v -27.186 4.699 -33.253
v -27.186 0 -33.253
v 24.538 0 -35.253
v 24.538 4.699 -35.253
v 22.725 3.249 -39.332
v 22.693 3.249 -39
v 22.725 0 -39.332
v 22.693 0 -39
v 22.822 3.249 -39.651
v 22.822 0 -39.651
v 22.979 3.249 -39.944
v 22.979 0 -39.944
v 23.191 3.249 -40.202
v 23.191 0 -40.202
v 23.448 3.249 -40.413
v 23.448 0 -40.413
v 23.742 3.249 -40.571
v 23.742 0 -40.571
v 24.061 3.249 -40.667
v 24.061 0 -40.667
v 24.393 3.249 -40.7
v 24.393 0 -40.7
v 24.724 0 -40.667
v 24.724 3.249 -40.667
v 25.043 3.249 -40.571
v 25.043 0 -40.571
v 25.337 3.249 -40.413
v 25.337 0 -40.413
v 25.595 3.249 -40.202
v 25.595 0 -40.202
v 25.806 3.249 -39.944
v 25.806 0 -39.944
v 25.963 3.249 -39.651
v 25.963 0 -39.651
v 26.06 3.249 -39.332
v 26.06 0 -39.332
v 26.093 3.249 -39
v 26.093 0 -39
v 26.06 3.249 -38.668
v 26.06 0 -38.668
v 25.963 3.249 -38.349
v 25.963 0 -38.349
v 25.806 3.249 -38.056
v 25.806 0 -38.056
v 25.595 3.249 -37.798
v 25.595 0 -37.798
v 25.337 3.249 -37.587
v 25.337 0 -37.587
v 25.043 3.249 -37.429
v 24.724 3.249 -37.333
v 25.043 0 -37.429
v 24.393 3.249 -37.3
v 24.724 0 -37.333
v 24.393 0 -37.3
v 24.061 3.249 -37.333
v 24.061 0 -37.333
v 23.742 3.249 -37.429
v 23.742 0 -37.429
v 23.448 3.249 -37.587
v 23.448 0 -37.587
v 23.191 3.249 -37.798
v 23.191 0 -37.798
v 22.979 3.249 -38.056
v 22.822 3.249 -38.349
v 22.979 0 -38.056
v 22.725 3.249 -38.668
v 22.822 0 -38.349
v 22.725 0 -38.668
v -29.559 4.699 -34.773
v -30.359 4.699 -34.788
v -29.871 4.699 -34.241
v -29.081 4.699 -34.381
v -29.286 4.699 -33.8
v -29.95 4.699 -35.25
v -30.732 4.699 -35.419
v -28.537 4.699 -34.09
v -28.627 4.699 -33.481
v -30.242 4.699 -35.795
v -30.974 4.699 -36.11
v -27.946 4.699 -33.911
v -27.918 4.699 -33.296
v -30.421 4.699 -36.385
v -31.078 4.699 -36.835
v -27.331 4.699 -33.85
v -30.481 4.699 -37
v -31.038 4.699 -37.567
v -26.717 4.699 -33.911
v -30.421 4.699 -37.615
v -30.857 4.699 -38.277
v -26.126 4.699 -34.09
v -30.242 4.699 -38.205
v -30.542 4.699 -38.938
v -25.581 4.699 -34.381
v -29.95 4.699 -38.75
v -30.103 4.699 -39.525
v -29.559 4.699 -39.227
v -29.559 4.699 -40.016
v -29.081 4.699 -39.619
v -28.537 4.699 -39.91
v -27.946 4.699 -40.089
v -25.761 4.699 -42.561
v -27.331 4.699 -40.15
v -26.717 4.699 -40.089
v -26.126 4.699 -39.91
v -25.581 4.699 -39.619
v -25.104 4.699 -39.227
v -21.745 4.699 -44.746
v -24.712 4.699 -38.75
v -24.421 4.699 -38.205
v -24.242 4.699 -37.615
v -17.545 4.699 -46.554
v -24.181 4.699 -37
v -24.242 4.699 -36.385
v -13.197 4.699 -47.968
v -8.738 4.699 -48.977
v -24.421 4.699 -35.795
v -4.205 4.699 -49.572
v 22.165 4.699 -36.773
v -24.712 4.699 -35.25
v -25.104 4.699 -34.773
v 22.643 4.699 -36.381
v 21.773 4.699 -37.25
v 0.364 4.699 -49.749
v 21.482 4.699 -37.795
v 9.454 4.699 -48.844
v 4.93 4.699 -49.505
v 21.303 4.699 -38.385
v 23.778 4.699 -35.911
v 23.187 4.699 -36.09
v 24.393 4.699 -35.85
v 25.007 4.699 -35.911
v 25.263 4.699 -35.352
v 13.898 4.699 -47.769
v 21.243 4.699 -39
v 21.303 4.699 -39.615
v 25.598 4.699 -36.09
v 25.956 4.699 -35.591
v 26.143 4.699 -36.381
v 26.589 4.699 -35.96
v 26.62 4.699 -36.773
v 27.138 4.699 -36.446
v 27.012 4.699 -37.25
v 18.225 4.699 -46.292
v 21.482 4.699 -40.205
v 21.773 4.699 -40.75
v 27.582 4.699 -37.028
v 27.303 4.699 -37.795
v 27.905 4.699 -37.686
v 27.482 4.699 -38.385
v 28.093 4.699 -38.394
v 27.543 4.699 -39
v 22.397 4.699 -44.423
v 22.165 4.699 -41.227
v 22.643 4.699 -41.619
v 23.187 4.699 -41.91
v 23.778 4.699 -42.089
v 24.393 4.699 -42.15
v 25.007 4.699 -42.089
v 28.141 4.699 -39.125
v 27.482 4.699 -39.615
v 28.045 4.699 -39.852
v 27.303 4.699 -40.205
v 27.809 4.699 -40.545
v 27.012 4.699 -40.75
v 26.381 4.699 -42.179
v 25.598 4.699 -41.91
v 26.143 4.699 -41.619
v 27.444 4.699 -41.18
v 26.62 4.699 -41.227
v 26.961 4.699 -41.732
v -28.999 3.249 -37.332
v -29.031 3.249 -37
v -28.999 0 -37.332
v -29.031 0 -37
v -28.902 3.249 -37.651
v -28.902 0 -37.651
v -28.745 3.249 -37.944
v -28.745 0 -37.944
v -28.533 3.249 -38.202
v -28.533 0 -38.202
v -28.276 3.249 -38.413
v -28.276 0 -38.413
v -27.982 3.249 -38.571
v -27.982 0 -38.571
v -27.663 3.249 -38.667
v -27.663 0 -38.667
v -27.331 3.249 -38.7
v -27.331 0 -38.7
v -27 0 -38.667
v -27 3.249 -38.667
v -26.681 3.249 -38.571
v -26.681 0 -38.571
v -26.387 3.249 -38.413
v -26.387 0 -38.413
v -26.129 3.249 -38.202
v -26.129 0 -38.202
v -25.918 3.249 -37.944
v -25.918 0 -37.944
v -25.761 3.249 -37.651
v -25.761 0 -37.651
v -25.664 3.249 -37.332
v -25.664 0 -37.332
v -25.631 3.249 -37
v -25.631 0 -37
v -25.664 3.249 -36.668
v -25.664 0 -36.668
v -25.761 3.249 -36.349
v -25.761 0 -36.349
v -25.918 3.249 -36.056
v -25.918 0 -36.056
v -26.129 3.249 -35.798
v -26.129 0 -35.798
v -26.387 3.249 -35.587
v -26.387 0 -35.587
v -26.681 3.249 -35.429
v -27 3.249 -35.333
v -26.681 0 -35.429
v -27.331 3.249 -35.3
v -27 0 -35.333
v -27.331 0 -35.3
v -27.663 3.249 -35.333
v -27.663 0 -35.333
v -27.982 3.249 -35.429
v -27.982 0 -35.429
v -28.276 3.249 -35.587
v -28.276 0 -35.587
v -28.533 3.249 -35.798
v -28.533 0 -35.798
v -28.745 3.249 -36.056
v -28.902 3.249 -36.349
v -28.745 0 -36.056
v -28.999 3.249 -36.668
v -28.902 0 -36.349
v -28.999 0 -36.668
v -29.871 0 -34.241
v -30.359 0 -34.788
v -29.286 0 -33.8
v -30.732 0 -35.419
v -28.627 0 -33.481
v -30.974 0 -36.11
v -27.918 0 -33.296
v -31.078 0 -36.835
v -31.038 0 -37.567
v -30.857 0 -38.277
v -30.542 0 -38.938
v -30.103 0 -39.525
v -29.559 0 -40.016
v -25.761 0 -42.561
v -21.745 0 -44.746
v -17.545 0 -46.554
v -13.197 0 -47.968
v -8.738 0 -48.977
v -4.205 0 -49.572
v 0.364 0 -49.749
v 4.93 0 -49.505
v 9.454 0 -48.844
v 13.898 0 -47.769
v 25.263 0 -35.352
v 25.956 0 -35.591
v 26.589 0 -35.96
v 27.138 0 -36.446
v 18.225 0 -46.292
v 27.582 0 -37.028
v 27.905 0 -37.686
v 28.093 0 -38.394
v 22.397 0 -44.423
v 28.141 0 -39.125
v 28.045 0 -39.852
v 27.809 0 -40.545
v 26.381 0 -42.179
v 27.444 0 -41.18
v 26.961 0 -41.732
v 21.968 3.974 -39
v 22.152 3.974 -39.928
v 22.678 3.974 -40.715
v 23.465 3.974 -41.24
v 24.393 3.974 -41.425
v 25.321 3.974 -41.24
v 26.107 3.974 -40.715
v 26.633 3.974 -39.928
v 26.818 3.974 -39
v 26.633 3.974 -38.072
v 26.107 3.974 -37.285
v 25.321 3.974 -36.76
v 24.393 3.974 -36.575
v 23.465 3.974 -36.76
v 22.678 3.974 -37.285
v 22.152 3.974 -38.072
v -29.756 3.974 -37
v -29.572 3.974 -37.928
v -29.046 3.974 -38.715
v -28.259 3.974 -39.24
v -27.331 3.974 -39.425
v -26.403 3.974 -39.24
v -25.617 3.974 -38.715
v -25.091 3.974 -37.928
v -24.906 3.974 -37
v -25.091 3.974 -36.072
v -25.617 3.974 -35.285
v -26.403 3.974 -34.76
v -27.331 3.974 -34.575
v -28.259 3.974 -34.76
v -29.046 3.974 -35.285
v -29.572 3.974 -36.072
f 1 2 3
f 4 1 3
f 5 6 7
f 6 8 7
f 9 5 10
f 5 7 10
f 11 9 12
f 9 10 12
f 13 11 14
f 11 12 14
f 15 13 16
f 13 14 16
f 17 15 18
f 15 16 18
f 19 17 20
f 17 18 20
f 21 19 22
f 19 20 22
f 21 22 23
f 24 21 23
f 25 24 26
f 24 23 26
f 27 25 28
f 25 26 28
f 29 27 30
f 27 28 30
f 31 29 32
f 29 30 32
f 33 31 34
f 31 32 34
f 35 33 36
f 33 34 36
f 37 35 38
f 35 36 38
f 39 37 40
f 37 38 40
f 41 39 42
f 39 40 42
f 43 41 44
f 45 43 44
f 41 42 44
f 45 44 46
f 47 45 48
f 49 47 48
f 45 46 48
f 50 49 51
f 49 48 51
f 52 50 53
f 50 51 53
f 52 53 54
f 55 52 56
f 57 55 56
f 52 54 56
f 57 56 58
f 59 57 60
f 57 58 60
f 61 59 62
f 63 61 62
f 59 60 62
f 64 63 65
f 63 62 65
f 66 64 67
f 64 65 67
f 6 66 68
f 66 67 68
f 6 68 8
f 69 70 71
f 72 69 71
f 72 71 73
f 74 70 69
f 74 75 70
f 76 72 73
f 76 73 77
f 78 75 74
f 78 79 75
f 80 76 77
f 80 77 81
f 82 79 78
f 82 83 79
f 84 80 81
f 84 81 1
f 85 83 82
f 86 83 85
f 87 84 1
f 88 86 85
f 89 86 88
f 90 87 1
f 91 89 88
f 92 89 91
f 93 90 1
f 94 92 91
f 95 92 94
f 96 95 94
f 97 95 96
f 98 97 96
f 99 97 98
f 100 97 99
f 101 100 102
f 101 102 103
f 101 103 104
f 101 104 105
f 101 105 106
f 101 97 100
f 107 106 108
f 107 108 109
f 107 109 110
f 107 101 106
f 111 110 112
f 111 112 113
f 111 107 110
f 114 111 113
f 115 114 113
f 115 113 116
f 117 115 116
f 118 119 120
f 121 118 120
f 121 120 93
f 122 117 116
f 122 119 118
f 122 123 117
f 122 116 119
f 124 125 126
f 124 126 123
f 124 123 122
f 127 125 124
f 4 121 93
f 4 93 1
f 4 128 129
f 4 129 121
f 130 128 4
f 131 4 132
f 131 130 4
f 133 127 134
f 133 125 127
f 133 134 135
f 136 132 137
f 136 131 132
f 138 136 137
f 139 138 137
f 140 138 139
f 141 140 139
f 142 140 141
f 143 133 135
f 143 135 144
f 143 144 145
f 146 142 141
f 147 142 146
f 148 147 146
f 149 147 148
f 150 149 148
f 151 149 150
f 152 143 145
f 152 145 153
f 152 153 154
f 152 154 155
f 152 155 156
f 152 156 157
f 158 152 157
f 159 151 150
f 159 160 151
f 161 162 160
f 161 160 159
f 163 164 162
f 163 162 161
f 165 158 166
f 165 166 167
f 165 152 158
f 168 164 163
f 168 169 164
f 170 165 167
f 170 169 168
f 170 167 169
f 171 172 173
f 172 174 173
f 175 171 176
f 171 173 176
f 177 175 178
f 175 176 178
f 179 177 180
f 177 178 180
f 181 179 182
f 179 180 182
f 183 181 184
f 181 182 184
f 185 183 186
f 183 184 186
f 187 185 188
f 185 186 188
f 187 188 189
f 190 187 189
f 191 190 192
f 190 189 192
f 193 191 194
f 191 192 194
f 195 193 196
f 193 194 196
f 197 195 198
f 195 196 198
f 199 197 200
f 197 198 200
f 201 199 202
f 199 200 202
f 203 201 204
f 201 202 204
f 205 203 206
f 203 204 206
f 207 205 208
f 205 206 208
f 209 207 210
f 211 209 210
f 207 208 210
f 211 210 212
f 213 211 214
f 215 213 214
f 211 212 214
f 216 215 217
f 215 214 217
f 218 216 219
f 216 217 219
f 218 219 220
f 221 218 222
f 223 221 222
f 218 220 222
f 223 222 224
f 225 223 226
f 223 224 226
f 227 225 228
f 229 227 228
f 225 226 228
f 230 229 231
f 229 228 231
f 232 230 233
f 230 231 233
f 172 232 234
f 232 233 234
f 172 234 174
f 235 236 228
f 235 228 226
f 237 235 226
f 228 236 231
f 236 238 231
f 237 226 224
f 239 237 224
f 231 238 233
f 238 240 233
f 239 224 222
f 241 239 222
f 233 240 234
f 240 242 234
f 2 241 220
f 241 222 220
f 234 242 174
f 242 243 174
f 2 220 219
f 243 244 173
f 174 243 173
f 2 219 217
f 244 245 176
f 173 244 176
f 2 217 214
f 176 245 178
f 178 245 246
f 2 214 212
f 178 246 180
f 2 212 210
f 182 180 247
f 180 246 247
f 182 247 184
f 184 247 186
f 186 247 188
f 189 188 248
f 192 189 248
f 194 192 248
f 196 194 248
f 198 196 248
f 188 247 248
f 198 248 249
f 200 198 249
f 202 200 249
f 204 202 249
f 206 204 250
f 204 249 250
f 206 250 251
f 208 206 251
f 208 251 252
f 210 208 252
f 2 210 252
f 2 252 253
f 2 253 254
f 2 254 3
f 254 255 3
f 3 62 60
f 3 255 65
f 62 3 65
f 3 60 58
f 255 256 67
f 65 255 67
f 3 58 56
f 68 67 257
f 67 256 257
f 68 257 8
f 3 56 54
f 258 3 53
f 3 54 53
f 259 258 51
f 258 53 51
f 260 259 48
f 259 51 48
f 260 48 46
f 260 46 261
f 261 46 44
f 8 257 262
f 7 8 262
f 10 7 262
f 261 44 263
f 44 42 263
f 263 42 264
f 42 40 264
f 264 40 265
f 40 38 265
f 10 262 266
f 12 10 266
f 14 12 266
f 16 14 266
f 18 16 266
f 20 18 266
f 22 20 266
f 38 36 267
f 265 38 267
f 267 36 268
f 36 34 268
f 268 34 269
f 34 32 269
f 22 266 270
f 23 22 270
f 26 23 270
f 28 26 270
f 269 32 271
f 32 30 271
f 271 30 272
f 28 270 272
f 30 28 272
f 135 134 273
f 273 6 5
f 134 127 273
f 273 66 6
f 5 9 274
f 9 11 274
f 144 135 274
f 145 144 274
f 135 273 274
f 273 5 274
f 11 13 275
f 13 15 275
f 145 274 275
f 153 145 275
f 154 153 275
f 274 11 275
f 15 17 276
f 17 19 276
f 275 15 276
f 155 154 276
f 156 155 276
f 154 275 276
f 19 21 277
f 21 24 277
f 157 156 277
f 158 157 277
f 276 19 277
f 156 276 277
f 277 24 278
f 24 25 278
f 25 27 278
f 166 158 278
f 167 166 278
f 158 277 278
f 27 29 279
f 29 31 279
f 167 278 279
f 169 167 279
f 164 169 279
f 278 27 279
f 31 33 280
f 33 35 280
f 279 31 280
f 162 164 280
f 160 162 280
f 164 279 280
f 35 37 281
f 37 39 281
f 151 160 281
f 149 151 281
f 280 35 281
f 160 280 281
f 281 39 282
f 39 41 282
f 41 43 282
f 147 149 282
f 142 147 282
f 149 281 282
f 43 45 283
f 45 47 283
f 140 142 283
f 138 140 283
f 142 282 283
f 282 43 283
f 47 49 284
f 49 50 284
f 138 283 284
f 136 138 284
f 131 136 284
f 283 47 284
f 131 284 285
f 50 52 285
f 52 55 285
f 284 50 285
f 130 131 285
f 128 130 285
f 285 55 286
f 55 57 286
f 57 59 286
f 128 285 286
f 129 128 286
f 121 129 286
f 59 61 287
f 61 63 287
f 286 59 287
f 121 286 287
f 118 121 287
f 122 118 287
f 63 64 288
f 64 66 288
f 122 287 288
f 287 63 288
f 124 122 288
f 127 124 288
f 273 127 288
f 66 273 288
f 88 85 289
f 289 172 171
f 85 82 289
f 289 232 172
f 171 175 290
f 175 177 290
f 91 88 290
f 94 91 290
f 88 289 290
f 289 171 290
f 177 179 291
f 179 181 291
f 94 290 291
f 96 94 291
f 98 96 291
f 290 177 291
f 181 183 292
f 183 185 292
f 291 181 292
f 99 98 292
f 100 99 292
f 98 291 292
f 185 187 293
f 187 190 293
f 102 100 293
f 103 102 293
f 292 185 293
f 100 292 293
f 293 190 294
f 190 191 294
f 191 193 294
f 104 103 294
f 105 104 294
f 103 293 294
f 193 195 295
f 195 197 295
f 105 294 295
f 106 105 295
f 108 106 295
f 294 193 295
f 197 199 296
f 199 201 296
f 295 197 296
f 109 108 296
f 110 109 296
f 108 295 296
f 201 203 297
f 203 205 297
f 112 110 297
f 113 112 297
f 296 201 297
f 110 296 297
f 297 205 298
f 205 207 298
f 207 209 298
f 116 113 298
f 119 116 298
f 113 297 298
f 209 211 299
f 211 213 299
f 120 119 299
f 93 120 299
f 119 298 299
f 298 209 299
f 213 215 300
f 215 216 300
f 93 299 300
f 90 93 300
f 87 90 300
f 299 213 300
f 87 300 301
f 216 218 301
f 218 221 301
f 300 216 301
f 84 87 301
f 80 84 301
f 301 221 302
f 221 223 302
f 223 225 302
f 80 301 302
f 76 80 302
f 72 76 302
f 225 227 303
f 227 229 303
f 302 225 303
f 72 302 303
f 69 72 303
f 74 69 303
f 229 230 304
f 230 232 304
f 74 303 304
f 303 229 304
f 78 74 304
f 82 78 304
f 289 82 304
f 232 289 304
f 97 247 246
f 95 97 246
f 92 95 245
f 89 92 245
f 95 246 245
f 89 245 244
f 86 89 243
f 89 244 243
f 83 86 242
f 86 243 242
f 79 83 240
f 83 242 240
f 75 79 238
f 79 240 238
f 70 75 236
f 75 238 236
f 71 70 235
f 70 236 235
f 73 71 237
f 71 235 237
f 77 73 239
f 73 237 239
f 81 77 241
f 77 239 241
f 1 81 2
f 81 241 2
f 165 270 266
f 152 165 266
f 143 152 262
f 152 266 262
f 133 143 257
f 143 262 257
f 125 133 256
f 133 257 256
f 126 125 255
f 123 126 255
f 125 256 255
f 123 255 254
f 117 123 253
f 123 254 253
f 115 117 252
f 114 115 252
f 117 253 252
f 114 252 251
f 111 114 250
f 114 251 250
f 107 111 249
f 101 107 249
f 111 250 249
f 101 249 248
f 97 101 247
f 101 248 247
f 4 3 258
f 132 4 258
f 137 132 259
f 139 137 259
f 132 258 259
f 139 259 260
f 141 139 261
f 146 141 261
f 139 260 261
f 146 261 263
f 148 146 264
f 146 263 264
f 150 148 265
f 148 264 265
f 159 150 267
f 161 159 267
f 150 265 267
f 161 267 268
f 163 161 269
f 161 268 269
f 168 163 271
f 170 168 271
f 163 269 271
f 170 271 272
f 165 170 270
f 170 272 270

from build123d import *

# Parameters (mm, degrees)
BOSS_EXTRUDE1_DEPTH                             = 4.699
CSK_FOR_M3_FLAT_HEAD_MACHINE_SCREW1_D           = 3.4
CSK_FOR_M3_FLAT_HEAD_MACHINE_SCREW1_CSINK_D     = 6.3
CSK_FOR_M3_FLAT_HEAD_MACHINE_SCREW1_CSINK_ANGLE = 90


with BuildPart() as part:
    # Sketch1 → Boss-Extrude1 (new body)
    with BuildSketch(Plane(origin=(0, 0, 0), x_dir=(1, 0, 0), z_dir=(0, 1, 0))):
        with BuildLine():
            Line((-27.186408409, 33.252800217), (24.537514164, 35.252800217))
            ThreePointArc((24.537514164, 35.252800217), (28.016450893, 38.035446755), (26.381150789, 42.179347826))
            ThreePointArc((26.381150789, 42.179347826), (-1.922238221, 49.712850454), (-29.559395906, 40.016304348))
            ThreePointArc((-29.559395906, 40.016304348), (-30.869828758, 35.758501128), (-27.186408409, 33.252800217))
        make_face()
    extrude(amount=BOSS_EXTRUDE1_DEPTH)

    # CSK for M3 Flat Head Machine Screw1 (through all)
    with Locations(Plane(origin=(0, 4.699, 0), x_dir=(1, 0, 0), z_dir=(0, 1, 0))):
        with Locations((-27.331300737, 37), (24.392621835, 39)):
            CounterSinkHole(CSK_FOR_M3_FLAT_HEAD_MACHINE_SCREW1_D / 2, CSK_FOR_M3_FLAT_HEAD_MACHINE_SCREW1_CSINK_D / 2, counter_sink_angle=CSK_FOR_M3_FLAT_HEAD_MACHINE_SCREW1_CSINK_ANGLE)


solid = part.part
